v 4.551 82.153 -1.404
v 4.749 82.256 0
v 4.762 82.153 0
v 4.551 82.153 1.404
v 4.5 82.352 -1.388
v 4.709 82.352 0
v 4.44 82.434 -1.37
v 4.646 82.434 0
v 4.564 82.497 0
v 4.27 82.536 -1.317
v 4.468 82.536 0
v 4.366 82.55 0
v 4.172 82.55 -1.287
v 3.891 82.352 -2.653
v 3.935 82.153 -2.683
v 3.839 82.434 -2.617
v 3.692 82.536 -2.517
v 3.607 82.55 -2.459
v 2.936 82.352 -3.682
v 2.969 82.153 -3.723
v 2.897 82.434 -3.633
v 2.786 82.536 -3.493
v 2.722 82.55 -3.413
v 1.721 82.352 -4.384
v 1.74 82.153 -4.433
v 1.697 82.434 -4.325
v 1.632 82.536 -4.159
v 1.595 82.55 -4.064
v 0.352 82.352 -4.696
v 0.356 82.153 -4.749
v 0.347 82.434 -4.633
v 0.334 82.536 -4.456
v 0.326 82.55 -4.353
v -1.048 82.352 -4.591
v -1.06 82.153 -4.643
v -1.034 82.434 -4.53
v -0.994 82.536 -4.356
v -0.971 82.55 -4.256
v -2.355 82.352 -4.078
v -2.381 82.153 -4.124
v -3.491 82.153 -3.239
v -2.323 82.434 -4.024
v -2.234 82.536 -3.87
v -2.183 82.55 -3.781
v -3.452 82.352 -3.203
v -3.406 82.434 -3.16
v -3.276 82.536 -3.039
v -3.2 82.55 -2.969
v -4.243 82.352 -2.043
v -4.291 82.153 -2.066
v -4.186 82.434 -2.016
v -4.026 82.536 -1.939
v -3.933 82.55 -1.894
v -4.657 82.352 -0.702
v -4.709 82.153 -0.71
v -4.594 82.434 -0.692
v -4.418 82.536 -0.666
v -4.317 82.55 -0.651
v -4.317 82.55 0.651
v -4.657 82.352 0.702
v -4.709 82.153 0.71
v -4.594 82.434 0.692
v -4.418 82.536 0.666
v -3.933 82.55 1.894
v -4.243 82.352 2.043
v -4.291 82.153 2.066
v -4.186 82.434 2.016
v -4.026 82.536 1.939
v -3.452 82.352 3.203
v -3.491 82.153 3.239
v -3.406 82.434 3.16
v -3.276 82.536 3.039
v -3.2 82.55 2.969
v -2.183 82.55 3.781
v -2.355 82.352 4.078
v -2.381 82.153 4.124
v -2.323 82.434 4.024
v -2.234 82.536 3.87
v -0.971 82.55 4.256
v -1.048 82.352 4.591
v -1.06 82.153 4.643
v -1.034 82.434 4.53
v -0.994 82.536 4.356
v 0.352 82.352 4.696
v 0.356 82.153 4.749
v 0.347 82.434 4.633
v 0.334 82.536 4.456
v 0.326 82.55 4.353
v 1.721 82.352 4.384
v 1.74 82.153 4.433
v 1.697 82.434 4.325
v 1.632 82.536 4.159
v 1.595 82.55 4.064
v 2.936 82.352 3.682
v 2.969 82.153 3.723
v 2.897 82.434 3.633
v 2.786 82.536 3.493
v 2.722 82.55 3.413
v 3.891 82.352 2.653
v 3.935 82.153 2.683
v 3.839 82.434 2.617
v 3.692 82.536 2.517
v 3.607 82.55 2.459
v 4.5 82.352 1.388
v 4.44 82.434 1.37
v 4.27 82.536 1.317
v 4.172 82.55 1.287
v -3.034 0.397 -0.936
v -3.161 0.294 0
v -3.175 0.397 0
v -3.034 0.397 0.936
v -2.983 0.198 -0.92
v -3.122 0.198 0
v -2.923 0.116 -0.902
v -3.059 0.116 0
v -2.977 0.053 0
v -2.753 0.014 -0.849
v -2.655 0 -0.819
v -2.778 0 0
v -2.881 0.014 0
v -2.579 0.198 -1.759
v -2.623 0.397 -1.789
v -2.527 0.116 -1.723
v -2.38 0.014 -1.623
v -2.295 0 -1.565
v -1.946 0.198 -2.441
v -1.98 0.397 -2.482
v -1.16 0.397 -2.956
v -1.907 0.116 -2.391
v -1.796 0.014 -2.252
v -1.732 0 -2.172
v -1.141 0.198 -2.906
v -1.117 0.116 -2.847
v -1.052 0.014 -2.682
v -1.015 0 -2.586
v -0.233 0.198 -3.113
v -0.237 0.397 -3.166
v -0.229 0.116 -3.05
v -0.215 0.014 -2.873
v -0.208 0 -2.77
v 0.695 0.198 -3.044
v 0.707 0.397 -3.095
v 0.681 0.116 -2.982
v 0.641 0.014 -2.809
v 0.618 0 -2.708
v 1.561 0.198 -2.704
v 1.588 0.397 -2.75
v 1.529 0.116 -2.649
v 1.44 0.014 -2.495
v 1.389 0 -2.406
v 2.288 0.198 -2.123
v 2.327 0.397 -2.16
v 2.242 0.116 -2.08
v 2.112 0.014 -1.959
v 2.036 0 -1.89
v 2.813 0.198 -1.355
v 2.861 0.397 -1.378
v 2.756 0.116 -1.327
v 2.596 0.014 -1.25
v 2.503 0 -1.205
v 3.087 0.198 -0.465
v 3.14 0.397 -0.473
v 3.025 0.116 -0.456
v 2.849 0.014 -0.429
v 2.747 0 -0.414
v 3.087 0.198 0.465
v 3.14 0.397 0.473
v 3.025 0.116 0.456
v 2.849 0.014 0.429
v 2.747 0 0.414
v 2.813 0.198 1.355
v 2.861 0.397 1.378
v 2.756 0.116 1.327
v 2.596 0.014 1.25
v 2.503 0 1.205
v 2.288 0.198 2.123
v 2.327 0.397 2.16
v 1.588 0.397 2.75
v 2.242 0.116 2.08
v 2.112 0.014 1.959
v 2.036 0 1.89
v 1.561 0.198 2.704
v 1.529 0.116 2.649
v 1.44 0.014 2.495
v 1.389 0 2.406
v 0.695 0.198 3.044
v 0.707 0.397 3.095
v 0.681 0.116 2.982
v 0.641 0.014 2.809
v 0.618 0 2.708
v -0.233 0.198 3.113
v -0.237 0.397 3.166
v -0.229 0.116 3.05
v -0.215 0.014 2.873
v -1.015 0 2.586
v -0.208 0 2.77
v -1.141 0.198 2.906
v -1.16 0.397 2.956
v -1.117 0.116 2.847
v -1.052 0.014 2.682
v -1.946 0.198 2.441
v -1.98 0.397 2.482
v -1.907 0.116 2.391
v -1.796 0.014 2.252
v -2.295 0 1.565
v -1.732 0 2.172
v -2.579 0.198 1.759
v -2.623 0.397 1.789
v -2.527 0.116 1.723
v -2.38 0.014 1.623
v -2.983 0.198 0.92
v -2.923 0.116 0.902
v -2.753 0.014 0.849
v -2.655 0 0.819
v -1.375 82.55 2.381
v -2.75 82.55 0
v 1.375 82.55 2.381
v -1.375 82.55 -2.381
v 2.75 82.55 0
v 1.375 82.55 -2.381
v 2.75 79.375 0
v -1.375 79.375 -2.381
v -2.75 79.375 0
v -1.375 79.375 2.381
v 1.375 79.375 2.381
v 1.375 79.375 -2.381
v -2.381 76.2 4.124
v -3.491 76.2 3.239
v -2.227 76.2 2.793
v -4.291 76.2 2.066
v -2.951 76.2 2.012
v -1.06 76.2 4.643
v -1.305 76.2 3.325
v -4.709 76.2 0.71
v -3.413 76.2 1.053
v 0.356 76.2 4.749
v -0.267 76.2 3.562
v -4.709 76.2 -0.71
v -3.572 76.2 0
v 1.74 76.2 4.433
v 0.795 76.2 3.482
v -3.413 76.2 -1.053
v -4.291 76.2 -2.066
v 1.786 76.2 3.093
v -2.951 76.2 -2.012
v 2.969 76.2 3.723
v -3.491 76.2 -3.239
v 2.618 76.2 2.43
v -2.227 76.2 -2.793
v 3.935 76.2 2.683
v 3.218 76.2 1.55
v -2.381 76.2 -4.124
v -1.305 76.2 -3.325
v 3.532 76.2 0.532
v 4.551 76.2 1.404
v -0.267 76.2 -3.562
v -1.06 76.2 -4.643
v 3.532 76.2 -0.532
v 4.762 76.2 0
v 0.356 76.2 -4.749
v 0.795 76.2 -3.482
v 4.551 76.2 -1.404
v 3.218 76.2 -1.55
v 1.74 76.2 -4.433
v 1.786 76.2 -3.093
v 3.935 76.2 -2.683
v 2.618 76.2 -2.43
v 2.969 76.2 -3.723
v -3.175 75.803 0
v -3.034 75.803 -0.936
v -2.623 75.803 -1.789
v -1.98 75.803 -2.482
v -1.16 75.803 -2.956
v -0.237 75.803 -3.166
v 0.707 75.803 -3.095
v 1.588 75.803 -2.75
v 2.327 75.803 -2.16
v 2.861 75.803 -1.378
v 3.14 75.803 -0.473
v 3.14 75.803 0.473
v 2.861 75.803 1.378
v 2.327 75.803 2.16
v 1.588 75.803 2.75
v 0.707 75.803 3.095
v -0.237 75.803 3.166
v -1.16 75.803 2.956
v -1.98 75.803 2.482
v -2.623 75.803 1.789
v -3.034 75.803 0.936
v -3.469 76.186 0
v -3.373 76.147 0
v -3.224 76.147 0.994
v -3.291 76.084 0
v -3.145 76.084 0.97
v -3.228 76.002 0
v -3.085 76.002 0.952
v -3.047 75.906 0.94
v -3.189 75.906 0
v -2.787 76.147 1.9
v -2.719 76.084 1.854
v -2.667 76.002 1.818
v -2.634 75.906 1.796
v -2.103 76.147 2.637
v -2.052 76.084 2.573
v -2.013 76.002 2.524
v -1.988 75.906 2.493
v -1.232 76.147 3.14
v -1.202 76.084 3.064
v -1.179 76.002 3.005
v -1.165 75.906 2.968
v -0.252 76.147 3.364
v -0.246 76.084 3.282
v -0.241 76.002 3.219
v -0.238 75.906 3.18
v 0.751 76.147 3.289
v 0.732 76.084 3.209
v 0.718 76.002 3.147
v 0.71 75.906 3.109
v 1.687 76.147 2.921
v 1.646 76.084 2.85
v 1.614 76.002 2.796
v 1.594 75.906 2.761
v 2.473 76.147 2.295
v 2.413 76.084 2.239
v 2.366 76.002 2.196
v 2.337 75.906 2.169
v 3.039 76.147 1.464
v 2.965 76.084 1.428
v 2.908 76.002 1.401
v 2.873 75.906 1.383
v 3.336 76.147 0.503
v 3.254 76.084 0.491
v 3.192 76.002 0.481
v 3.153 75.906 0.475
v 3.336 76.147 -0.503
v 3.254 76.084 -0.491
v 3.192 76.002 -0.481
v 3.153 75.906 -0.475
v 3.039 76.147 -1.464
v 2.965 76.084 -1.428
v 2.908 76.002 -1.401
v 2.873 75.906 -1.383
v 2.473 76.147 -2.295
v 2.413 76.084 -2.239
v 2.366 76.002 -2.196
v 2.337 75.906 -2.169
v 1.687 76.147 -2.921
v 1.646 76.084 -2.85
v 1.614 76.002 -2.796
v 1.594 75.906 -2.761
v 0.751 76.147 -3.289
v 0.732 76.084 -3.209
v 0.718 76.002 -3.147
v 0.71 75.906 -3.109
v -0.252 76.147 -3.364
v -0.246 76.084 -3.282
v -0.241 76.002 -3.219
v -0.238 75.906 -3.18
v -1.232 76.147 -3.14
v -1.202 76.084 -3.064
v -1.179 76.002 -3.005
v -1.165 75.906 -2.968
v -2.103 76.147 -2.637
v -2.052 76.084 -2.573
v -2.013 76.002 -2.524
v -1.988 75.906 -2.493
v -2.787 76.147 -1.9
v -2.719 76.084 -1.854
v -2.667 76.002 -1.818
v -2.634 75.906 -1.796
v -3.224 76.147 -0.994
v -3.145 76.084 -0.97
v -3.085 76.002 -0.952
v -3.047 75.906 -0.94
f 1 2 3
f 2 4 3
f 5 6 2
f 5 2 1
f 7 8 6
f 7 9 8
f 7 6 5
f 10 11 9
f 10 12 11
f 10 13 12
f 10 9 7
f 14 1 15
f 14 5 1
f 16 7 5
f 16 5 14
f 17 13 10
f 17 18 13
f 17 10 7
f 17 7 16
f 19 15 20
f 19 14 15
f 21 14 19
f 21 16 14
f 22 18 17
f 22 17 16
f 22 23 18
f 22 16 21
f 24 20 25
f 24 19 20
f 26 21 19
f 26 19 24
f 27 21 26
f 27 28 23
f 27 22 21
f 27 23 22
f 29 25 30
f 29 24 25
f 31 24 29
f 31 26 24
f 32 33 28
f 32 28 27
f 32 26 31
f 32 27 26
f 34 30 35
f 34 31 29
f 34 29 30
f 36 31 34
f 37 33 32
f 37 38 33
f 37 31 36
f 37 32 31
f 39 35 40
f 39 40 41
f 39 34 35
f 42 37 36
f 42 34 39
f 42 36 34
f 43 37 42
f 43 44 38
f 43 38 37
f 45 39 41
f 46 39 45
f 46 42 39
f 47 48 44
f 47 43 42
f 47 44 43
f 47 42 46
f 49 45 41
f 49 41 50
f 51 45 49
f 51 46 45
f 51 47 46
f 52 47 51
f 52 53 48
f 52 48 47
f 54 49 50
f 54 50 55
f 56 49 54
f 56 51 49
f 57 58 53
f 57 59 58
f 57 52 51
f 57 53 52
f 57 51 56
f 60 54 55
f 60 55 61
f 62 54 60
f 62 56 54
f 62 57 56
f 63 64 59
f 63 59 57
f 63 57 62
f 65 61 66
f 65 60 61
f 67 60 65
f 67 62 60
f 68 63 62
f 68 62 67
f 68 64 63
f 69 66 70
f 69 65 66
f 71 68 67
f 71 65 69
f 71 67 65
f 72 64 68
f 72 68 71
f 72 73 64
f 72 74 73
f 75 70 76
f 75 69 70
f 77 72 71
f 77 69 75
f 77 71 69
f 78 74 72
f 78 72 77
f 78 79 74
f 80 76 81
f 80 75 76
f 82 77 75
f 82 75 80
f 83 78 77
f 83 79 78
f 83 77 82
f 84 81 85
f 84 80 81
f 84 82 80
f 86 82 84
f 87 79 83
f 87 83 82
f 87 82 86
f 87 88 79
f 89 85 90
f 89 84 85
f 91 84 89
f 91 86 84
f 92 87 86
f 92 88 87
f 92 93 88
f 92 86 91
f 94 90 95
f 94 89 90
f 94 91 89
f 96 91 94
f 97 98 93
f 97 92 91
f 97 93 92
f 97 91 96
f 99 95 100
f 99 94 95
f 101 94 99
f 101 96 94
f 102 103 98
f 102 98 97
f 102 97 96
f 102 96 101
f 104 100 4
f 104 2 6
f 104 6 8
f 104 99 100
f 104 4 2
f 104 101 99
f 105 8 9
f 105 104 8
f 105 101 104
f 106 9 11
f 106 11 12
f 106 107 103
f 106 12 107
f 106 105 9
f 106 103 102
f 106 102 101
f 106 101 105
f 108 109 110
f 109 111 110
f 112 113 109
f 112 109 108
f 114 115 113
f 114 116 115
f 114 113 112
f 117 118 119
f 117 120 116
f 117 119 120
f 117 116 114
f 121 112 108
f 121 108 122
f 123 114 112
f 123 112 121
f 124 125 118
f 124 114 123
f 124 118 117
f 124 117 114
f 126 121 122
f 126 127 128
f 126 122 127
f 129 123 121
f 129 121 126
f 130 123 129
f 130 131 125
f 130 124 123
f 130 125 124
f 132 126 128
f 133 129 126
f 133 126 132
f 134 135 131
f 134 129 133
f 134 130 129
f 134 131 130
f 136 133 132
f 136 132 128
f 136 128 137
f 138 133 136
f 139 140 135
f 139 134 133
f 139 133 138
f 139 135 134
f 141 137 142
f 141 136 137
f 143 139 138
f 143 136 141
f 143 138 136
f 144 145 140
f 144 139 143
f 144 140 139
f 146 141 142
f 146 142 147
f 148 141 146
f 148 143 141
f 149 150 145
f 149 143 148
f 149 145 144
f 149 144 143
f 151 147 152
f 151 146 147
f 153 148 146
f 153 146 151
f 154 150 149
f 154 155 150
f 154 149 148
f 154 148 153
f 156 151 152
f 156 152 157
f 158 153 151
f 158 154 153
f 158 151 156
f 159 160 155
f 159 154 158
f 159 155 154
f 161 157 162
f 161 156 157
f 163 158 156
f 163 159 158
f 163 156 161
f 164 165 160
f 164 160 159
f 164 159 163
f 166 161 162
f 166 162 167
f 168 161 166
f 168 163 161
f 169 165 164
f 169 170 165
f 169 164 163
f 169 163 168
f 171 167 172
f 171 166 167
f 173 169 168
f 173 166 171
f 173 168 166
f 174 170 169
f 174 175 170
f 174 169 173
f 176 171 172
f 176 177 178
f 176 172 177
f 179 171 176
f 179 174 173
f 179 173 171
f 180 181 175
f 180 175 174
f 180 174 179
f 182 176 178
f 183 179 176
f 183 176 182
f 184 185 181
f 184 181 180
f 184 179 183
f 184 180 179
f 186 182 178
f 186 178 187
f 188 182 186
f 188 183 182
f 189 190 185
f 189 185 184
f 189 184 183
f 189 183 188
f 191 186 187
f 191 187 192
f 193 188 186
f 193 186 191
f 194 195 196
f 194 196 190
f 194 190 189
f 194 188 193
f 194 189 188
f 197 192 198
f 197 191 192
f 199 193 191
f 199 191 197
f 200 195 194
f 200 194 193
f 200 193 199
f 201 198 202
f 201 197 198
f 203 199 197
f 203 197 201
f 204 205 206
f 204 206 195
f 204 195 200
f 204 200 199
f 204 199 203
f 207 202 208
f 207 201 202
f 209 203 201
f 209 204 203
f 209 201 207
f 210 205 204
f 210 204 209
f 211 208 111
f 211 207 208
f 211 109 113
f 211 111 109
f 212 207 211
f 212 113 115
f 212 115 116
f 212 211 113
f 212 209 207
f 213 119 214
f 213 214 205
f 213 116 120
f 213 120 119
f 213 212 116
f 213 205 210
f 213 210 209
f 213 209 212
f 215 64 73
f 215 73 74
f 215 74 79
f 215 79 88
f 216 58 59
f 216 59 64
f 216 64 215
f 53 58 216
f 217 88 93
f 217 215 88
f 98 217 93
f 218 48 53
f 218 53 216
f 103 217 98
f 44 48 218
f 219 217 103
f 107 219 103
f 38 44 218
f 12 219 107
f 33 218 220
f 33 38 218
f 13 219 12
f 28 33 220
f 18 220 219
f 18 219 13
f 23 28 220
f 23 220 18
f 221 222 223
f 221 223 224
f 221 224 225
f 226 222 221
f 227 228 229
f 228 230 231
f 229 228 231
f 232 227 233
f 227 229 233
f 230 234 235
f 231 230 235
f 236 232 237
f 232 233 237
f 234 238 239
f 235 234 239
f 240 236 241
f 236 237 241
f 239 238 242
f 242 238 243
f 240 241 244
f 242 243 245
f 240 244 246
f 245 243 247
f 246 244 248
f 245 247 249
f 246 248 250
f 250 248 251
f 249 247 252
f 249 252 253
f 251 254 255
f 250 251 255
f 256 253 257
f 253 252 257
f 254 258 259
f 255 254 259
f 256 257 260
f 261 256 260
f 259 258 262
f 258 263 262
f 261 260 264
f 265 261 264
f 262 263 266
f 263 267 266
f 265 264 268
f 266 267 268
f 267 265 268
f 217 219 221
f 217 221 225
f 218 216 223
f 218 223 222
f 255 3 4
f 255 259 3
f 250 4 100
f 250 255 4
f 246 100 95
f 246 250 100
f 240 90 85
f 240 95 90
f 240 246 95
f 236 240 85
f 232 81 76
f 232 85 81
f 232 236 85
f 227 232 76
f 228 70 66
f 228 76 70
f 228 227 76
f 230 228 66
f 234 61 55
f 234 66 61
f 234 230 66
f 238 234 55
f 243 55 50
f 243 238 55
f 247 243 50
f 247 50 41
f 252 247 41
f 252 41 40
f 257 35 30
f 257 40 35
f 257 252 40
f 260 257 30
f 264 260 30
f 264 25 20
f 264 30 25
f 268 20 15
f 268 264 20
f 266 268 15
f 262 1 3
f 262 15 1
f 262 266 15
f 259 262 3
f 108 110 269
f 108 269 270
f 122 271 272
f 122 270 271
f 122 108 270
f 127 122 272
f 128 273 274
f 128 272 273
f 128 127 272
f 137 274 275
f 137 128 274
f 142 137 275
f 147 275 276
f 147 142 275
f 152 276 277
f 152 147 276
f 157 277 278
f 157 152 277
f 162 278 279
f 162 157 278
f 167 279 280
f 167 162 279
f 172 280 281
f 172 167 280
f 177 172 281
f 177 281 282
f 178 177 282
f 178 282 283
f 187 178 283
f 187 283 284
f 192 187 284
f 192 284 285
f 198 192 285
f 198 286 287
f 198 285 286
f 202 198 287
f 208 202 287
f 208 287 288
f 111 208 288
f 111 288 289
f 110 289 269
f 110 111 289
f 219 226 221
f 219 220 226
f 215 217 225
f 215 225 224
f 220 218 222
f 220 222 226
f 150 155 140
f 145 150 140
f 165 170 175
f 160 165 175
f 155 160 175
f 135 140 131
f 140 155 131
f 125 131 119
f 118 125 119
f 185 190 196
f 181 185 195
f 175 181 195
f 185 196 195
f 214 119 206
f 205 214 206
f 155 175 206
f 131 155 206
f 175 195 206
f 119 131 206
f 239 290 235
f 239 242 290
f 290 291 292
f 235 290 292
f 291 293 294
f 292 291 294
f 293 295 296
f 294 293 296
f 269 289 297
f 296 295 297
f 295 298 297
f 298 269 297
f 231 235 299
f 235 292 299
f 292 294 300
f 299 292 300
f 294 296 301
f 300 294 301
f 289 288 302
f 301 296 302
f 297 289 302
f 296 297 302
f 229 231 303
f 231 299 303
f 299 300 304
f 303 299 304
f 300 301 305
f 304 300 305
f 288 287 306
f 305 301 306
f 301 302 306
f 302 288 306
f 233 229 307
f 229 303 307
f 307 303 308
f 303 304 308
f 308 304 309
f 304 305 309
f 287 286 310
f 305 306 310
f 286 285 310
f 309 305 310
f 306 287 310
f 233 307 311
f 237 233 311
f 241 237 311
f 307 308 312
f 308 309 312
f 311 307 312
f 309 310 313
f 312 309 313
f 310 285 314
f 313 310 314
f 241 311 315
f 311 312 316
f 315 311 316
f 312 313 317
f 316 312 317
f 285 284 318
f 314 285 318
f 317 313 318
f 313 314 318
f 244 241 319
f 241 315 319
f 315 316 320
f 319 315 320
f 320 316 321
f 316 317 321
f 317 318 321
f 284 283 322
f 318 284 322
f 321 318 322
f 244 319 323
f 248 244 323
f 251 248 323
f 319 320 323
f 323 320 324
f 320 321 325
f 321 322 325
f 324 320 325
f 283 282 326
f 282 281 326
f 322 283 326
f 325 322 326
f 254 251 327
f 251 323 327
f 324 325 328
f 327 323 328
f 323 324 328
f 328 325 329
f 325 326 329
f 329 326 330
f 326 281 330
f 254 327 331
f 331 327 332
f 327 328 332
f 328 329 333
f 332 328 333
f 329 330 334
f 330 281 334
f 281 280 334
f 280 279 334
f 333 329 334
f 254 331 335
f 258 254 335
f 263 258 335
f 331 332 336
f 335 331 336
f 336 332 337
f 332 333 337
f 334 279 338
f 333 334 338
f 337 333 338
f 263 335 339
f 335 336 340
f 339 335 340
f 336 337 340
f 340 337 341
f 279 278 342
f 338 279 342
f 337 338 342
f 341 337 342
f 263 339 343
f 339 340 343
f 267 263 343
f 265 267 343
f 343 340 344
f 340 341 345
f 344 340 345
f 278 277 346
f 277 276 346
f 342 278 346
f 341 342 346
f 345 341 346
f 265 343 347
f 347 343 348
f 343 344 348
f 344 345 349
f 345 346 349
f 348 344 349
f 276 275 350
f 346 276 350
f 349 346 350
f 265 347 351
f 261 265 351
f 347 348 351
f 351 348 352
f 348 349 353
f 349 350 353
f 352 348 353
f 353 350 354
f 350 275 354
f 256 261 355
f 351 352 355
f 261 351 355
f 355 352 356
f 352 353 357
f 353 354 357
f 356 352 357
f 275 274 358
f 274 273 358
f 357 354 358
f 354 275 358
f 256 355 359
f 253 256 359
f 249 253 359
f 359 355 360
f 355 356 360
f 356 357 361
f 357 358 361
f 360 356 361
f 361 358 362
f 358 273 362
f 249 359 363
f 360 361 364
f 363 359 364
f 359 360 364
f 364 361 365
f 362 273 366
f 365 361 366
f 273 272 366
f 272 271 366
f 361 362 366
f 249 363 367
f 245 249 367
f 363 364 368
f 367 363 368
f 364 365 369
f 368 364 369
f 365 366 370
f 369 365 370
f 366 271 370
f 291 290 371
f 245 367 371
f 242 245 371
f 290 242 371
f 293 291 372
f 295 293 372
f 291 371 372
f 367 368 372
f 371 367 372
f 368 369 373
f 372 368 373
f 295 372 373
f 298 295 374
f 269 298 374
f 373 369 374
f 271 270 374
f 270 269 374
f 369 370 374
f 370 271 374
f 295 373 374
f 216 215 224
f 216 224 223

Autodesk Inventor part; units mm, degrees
ref_plane "YZ Plane" through (0, 0, 0) normal (1, 0, 0) x (0, 1, 0)
ref_plane "XZ Plane" through (0, 0, 0) normal (0, 1, 0) x (-1, 0, 0)
ref_plane "XY Plane" through (0, 0, 0) normal (0, 0, 1) x (1, 0, 0)
sketch "Sketch1" plane through (0, 0, 0) normal (0, 1, 0) x (-1, 0, 0)
  circle A0 centre (0, 0) radius 3.175
  dimension "d0" = 6.35
extrude "Extrusion1" add sketch "Sketch1" along normal blind 76.2
sketch "Sketch2" plane through (0, 76.2, 0) normal (0, 1, 0) x (1, 0, 0)
  circle A0 centre (0, 0) radius 3.175 projected
  circle A1 centre (0, 0) radius 4.7625
  dimension "d3" = 9.525
extrude "Extrusion2" add sketch "Sketch2" along normal blind 6.35 contours A0 | A1
sketch "Sketch3" plane through (0, 82.55, 0) normal (0, 1, 0) x (1, 0, 0)
  circle A0 centre (0, 0) radius 4.7625 projected
  line L0 (-1.3748, 2.3812) -> (1.3748, 2.3813)
  line L1 (1.3748, 2.3813) -> (2.7496, 0)
  line L2 (2.7496, 0) -> (1.3748, -2.3813)
  line L3 (1.3748, -2.3813) -> (-1.3748, -2.3813)
  line L4 (-1.3748, -2.3813) -> (-2.7496, 0)
  line L5 (-2.7496, 0) -> (-1.3748, 2.3812)
  dimension "d6" = 4.7625
extrude "Extrusion3" cut sketch "Sketch3" against normal blind 3.175 contours L0 L1 L2 L3 L4 L5
fillet "Fillet1" radius 0.3969 3 edges at (3.175, 76.2, 0) (-4.7625, 82.55, 0) (3.175, 0, 0)
properties part number "Bolt_0.25_20_3.0len_SocketHead" material "Stainless Steel, Austenitic"
